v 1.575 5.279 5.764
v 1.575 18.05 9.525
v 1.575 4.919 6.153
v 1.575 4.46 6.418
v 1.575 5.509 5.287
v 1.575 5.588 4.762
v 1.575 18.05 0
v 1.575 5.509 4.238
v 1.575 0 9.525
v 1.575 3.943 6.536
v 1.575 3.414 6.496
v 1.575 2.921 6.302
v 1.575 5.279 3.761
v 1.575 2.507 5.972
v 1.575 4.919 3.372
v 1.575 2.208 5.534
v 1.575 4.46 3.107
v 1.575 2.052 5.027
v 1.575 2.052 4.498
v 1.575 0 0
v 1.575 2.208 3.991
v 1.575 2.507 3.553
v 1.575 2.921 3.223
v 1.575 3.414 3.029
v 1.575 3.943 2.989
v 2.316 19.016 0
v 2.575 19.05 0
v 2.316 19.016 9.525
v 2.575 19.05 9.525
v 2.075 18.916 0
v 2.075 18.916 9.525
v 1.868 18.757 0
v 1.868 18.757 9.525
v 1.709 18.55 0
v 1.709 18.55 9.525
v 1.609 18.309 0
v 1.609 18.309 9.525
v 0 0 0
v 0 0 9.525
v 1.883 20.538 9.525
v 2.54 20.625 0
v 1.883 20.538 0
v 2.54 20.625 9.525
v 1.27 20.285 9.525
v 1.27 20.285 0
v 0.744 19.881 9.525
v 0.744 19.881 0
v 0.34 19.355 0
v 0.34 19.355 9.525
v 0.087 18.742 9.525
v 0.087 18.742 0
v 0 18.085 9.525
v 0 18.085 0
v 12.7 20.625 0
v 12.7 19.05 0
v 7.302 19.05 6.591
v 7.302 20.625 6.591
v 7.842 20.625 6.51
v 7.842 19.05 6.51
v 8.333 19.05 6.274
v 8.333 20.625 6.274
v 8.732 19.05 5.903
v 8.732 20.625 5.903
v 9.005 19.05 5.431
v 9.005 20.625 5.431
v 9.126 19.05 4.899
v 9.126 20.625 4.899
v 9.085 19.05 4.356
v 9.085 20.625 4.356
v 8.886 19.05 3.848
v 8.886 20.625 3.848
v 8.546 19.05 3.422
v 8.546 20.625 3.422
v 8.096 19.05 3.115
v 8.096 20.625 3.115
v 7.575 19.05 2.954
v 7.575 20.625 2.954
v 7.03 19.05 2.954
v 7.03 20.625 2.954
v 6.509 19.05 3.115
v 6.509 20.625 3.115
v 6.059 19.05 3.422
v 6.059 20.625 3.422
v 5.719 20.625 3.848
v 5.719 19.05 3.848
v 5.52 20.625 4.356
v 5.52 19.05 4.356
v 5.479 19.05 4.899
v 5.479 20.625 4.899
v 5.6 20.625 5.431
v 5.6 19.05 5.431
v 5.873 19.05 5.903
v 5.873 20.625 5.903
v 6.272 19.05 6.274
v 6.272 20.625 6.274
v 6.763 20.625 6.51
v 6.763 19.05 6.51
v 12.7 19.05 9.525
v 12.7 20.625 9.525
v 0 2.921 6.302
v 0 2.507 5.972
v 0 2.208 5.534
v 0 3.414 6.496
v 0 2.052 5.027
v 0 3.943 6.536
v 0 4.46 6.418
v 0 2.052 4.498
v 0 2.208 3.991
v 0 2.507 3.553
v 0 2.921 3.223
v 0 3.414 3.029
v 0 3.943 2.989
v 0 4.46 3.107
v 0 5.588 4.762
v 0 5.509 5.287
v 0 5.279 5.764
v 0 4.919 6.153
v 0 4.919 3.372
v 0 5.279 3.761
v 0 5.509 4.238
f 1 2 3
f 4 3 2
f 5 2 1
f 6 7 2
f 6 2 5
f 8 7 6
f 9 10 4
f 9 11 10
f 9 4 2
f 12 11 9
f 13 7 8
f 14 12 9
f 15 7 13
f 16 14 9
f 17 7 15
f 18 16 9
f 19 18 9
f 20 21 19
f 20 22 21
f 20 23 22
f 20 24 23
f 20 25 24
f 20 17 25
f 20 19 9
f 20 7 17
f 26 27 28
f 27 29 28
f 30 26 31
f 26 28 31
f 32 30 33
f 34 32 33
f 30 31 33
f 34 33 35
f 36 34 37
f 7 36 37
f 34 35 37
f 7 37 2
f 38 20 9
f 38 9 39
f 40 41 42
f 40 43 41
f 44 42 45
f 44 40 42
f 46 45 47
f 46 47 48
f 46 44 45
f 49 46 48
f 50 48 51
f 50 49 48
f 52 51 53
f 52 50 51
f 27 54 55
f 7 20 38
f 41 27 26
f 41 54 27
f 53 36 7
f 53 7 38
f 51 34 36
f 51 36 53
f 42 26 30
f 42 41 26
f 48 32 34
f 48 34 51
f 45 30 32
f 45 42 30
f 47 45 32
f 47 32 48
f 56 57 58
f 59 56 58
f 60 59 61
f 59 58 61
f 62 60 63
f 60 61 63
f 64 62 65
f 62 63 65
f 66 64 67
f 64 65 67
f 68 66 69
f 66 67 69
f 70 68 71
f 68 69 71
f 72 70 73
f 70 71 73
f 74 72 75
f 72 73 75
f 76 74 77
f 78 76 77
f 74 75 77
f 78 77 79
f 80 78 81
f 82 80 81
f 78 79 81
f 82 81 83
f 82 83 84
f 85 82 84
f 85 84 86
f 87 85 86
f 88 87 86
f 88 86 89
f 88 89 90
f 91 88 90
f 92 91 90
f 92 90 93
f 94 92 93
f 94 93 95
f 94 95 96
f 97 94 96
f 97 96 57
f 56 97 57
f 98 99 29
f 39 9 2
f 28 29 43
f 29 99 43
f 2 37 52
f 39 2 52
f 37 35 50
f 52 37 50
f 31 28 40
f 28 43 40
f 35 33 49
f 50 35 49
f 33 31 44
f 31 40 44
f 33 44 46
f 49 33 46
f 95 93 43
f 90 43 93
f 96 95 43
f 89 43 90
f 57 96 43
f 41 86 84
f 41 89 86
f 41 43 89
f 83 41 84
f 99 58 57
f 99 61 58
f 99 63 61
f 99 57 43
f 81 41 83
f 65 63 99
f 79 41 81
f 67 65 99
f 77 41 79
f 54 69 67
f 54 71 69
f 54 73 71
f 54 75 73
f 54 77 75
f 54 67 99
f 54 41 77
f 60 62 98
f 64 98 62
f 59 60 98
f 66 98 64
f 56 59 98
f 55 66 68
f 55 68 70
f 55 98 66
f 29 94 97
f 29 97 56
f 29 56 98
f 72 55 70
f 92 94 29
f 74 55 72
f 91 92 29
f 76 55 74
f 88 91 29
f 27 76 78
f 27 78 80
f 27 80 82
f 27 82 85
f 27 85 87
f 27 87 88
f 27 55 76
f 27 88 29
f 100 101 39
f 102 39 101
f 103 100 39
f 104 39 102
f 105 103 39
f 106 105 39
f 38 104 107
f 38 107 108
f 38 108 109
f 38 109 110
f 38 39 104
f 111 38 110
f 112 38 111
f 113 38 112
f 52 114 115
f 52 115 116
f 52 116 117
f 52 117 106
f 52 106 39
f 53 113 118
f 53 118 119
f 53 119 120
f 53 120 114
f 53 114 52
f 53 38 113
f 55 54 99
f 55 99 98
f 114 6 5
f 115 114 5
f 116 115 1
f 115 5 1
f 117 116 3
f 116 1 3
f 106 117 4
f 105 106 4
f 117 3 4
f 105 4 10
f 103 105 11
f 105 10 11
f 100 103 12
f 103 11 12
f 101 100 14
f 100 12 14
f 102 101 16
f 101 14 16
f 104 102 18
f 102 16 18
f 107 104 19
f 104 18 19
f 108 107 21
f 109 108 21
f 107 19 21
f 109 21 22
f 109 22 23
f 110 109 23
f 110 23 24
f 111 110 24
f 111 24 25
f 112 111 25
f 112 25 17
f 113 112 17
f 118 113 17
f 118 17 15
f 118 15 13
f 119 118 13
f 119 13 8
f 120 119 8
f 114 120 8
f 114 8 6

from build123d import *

# Parameters (mm, degrees)
BOSS_EXTRUDE1_DEPTH = 9.525
FILLET1_R           = 1
FILLET2_R           = 2.54
SKETCH2_R           = 1.778
CUT_EXTRUDE1_DEPTH  = 26.295811414
SKETCH3_R           = 1.8288
CUT_EXTRUDE2_DEPTH  = 27.026870731


with BuildPart() as part:
    # Sketch1 → Boss-Extrude1 (new body)
    with BuildSketch(Plane.XY):
        Polygon((0, 0), (0, 20.6248), (12.7, 20.6248), (12.7, 19.05), (1.5748, 19.05), (1.5748, 0), align=None)
    extrude(amount=BOSS_EXTRUDE1_DEPTH)

    # Fillet1
    fillet1_edges = [part.edges().sort_by_distance(p)[0] for p in [
        (1.5748, 19.05, 4.7625),
    ]]
    fillet(fillet1_edges, radius=FILLET1_R)

    # Fillet2
    fillet2_edges = [part.edges().sort_by_distance(p)[0] for p in [
        (0, 20.6248, 4.7625),
    ]]
    fillet(fillet2_edges, radius=FILLET2_R)

    # Sketch2 → Cut-Extrude1 (cut, through all)
    with BuildSketch(Plane(origin=(1.5748, 0, 0), x_dir=(0, 0, -1), z_dir=(1, 0, 0))):
        with Locations(Location((-4.7625, 3.81, 0), (0, 0, 90))):
            Circle(SKETCH2_R)
    extrude(amount=-CUT_EXTRUDE1_DEPTH, mode=Mode.SUBTRACT)

    # Sketch3 → Cut-Extrude2 (cut, through all)
    with BuildSketch(Plane(origin=(0, 20.6248, 0), x_dir=(1, 0, 0), z_dir=(0, 1, 0))):
        with Locations(Location((7.3025, -4.7625, 0), (0, 0, 270))):
            Circle(SKETCH3_R)
    extrude(amount=-CUT_EXTRUDE2_DEPTH, mode=Mode.SUBTRACT)


solid = part.part
